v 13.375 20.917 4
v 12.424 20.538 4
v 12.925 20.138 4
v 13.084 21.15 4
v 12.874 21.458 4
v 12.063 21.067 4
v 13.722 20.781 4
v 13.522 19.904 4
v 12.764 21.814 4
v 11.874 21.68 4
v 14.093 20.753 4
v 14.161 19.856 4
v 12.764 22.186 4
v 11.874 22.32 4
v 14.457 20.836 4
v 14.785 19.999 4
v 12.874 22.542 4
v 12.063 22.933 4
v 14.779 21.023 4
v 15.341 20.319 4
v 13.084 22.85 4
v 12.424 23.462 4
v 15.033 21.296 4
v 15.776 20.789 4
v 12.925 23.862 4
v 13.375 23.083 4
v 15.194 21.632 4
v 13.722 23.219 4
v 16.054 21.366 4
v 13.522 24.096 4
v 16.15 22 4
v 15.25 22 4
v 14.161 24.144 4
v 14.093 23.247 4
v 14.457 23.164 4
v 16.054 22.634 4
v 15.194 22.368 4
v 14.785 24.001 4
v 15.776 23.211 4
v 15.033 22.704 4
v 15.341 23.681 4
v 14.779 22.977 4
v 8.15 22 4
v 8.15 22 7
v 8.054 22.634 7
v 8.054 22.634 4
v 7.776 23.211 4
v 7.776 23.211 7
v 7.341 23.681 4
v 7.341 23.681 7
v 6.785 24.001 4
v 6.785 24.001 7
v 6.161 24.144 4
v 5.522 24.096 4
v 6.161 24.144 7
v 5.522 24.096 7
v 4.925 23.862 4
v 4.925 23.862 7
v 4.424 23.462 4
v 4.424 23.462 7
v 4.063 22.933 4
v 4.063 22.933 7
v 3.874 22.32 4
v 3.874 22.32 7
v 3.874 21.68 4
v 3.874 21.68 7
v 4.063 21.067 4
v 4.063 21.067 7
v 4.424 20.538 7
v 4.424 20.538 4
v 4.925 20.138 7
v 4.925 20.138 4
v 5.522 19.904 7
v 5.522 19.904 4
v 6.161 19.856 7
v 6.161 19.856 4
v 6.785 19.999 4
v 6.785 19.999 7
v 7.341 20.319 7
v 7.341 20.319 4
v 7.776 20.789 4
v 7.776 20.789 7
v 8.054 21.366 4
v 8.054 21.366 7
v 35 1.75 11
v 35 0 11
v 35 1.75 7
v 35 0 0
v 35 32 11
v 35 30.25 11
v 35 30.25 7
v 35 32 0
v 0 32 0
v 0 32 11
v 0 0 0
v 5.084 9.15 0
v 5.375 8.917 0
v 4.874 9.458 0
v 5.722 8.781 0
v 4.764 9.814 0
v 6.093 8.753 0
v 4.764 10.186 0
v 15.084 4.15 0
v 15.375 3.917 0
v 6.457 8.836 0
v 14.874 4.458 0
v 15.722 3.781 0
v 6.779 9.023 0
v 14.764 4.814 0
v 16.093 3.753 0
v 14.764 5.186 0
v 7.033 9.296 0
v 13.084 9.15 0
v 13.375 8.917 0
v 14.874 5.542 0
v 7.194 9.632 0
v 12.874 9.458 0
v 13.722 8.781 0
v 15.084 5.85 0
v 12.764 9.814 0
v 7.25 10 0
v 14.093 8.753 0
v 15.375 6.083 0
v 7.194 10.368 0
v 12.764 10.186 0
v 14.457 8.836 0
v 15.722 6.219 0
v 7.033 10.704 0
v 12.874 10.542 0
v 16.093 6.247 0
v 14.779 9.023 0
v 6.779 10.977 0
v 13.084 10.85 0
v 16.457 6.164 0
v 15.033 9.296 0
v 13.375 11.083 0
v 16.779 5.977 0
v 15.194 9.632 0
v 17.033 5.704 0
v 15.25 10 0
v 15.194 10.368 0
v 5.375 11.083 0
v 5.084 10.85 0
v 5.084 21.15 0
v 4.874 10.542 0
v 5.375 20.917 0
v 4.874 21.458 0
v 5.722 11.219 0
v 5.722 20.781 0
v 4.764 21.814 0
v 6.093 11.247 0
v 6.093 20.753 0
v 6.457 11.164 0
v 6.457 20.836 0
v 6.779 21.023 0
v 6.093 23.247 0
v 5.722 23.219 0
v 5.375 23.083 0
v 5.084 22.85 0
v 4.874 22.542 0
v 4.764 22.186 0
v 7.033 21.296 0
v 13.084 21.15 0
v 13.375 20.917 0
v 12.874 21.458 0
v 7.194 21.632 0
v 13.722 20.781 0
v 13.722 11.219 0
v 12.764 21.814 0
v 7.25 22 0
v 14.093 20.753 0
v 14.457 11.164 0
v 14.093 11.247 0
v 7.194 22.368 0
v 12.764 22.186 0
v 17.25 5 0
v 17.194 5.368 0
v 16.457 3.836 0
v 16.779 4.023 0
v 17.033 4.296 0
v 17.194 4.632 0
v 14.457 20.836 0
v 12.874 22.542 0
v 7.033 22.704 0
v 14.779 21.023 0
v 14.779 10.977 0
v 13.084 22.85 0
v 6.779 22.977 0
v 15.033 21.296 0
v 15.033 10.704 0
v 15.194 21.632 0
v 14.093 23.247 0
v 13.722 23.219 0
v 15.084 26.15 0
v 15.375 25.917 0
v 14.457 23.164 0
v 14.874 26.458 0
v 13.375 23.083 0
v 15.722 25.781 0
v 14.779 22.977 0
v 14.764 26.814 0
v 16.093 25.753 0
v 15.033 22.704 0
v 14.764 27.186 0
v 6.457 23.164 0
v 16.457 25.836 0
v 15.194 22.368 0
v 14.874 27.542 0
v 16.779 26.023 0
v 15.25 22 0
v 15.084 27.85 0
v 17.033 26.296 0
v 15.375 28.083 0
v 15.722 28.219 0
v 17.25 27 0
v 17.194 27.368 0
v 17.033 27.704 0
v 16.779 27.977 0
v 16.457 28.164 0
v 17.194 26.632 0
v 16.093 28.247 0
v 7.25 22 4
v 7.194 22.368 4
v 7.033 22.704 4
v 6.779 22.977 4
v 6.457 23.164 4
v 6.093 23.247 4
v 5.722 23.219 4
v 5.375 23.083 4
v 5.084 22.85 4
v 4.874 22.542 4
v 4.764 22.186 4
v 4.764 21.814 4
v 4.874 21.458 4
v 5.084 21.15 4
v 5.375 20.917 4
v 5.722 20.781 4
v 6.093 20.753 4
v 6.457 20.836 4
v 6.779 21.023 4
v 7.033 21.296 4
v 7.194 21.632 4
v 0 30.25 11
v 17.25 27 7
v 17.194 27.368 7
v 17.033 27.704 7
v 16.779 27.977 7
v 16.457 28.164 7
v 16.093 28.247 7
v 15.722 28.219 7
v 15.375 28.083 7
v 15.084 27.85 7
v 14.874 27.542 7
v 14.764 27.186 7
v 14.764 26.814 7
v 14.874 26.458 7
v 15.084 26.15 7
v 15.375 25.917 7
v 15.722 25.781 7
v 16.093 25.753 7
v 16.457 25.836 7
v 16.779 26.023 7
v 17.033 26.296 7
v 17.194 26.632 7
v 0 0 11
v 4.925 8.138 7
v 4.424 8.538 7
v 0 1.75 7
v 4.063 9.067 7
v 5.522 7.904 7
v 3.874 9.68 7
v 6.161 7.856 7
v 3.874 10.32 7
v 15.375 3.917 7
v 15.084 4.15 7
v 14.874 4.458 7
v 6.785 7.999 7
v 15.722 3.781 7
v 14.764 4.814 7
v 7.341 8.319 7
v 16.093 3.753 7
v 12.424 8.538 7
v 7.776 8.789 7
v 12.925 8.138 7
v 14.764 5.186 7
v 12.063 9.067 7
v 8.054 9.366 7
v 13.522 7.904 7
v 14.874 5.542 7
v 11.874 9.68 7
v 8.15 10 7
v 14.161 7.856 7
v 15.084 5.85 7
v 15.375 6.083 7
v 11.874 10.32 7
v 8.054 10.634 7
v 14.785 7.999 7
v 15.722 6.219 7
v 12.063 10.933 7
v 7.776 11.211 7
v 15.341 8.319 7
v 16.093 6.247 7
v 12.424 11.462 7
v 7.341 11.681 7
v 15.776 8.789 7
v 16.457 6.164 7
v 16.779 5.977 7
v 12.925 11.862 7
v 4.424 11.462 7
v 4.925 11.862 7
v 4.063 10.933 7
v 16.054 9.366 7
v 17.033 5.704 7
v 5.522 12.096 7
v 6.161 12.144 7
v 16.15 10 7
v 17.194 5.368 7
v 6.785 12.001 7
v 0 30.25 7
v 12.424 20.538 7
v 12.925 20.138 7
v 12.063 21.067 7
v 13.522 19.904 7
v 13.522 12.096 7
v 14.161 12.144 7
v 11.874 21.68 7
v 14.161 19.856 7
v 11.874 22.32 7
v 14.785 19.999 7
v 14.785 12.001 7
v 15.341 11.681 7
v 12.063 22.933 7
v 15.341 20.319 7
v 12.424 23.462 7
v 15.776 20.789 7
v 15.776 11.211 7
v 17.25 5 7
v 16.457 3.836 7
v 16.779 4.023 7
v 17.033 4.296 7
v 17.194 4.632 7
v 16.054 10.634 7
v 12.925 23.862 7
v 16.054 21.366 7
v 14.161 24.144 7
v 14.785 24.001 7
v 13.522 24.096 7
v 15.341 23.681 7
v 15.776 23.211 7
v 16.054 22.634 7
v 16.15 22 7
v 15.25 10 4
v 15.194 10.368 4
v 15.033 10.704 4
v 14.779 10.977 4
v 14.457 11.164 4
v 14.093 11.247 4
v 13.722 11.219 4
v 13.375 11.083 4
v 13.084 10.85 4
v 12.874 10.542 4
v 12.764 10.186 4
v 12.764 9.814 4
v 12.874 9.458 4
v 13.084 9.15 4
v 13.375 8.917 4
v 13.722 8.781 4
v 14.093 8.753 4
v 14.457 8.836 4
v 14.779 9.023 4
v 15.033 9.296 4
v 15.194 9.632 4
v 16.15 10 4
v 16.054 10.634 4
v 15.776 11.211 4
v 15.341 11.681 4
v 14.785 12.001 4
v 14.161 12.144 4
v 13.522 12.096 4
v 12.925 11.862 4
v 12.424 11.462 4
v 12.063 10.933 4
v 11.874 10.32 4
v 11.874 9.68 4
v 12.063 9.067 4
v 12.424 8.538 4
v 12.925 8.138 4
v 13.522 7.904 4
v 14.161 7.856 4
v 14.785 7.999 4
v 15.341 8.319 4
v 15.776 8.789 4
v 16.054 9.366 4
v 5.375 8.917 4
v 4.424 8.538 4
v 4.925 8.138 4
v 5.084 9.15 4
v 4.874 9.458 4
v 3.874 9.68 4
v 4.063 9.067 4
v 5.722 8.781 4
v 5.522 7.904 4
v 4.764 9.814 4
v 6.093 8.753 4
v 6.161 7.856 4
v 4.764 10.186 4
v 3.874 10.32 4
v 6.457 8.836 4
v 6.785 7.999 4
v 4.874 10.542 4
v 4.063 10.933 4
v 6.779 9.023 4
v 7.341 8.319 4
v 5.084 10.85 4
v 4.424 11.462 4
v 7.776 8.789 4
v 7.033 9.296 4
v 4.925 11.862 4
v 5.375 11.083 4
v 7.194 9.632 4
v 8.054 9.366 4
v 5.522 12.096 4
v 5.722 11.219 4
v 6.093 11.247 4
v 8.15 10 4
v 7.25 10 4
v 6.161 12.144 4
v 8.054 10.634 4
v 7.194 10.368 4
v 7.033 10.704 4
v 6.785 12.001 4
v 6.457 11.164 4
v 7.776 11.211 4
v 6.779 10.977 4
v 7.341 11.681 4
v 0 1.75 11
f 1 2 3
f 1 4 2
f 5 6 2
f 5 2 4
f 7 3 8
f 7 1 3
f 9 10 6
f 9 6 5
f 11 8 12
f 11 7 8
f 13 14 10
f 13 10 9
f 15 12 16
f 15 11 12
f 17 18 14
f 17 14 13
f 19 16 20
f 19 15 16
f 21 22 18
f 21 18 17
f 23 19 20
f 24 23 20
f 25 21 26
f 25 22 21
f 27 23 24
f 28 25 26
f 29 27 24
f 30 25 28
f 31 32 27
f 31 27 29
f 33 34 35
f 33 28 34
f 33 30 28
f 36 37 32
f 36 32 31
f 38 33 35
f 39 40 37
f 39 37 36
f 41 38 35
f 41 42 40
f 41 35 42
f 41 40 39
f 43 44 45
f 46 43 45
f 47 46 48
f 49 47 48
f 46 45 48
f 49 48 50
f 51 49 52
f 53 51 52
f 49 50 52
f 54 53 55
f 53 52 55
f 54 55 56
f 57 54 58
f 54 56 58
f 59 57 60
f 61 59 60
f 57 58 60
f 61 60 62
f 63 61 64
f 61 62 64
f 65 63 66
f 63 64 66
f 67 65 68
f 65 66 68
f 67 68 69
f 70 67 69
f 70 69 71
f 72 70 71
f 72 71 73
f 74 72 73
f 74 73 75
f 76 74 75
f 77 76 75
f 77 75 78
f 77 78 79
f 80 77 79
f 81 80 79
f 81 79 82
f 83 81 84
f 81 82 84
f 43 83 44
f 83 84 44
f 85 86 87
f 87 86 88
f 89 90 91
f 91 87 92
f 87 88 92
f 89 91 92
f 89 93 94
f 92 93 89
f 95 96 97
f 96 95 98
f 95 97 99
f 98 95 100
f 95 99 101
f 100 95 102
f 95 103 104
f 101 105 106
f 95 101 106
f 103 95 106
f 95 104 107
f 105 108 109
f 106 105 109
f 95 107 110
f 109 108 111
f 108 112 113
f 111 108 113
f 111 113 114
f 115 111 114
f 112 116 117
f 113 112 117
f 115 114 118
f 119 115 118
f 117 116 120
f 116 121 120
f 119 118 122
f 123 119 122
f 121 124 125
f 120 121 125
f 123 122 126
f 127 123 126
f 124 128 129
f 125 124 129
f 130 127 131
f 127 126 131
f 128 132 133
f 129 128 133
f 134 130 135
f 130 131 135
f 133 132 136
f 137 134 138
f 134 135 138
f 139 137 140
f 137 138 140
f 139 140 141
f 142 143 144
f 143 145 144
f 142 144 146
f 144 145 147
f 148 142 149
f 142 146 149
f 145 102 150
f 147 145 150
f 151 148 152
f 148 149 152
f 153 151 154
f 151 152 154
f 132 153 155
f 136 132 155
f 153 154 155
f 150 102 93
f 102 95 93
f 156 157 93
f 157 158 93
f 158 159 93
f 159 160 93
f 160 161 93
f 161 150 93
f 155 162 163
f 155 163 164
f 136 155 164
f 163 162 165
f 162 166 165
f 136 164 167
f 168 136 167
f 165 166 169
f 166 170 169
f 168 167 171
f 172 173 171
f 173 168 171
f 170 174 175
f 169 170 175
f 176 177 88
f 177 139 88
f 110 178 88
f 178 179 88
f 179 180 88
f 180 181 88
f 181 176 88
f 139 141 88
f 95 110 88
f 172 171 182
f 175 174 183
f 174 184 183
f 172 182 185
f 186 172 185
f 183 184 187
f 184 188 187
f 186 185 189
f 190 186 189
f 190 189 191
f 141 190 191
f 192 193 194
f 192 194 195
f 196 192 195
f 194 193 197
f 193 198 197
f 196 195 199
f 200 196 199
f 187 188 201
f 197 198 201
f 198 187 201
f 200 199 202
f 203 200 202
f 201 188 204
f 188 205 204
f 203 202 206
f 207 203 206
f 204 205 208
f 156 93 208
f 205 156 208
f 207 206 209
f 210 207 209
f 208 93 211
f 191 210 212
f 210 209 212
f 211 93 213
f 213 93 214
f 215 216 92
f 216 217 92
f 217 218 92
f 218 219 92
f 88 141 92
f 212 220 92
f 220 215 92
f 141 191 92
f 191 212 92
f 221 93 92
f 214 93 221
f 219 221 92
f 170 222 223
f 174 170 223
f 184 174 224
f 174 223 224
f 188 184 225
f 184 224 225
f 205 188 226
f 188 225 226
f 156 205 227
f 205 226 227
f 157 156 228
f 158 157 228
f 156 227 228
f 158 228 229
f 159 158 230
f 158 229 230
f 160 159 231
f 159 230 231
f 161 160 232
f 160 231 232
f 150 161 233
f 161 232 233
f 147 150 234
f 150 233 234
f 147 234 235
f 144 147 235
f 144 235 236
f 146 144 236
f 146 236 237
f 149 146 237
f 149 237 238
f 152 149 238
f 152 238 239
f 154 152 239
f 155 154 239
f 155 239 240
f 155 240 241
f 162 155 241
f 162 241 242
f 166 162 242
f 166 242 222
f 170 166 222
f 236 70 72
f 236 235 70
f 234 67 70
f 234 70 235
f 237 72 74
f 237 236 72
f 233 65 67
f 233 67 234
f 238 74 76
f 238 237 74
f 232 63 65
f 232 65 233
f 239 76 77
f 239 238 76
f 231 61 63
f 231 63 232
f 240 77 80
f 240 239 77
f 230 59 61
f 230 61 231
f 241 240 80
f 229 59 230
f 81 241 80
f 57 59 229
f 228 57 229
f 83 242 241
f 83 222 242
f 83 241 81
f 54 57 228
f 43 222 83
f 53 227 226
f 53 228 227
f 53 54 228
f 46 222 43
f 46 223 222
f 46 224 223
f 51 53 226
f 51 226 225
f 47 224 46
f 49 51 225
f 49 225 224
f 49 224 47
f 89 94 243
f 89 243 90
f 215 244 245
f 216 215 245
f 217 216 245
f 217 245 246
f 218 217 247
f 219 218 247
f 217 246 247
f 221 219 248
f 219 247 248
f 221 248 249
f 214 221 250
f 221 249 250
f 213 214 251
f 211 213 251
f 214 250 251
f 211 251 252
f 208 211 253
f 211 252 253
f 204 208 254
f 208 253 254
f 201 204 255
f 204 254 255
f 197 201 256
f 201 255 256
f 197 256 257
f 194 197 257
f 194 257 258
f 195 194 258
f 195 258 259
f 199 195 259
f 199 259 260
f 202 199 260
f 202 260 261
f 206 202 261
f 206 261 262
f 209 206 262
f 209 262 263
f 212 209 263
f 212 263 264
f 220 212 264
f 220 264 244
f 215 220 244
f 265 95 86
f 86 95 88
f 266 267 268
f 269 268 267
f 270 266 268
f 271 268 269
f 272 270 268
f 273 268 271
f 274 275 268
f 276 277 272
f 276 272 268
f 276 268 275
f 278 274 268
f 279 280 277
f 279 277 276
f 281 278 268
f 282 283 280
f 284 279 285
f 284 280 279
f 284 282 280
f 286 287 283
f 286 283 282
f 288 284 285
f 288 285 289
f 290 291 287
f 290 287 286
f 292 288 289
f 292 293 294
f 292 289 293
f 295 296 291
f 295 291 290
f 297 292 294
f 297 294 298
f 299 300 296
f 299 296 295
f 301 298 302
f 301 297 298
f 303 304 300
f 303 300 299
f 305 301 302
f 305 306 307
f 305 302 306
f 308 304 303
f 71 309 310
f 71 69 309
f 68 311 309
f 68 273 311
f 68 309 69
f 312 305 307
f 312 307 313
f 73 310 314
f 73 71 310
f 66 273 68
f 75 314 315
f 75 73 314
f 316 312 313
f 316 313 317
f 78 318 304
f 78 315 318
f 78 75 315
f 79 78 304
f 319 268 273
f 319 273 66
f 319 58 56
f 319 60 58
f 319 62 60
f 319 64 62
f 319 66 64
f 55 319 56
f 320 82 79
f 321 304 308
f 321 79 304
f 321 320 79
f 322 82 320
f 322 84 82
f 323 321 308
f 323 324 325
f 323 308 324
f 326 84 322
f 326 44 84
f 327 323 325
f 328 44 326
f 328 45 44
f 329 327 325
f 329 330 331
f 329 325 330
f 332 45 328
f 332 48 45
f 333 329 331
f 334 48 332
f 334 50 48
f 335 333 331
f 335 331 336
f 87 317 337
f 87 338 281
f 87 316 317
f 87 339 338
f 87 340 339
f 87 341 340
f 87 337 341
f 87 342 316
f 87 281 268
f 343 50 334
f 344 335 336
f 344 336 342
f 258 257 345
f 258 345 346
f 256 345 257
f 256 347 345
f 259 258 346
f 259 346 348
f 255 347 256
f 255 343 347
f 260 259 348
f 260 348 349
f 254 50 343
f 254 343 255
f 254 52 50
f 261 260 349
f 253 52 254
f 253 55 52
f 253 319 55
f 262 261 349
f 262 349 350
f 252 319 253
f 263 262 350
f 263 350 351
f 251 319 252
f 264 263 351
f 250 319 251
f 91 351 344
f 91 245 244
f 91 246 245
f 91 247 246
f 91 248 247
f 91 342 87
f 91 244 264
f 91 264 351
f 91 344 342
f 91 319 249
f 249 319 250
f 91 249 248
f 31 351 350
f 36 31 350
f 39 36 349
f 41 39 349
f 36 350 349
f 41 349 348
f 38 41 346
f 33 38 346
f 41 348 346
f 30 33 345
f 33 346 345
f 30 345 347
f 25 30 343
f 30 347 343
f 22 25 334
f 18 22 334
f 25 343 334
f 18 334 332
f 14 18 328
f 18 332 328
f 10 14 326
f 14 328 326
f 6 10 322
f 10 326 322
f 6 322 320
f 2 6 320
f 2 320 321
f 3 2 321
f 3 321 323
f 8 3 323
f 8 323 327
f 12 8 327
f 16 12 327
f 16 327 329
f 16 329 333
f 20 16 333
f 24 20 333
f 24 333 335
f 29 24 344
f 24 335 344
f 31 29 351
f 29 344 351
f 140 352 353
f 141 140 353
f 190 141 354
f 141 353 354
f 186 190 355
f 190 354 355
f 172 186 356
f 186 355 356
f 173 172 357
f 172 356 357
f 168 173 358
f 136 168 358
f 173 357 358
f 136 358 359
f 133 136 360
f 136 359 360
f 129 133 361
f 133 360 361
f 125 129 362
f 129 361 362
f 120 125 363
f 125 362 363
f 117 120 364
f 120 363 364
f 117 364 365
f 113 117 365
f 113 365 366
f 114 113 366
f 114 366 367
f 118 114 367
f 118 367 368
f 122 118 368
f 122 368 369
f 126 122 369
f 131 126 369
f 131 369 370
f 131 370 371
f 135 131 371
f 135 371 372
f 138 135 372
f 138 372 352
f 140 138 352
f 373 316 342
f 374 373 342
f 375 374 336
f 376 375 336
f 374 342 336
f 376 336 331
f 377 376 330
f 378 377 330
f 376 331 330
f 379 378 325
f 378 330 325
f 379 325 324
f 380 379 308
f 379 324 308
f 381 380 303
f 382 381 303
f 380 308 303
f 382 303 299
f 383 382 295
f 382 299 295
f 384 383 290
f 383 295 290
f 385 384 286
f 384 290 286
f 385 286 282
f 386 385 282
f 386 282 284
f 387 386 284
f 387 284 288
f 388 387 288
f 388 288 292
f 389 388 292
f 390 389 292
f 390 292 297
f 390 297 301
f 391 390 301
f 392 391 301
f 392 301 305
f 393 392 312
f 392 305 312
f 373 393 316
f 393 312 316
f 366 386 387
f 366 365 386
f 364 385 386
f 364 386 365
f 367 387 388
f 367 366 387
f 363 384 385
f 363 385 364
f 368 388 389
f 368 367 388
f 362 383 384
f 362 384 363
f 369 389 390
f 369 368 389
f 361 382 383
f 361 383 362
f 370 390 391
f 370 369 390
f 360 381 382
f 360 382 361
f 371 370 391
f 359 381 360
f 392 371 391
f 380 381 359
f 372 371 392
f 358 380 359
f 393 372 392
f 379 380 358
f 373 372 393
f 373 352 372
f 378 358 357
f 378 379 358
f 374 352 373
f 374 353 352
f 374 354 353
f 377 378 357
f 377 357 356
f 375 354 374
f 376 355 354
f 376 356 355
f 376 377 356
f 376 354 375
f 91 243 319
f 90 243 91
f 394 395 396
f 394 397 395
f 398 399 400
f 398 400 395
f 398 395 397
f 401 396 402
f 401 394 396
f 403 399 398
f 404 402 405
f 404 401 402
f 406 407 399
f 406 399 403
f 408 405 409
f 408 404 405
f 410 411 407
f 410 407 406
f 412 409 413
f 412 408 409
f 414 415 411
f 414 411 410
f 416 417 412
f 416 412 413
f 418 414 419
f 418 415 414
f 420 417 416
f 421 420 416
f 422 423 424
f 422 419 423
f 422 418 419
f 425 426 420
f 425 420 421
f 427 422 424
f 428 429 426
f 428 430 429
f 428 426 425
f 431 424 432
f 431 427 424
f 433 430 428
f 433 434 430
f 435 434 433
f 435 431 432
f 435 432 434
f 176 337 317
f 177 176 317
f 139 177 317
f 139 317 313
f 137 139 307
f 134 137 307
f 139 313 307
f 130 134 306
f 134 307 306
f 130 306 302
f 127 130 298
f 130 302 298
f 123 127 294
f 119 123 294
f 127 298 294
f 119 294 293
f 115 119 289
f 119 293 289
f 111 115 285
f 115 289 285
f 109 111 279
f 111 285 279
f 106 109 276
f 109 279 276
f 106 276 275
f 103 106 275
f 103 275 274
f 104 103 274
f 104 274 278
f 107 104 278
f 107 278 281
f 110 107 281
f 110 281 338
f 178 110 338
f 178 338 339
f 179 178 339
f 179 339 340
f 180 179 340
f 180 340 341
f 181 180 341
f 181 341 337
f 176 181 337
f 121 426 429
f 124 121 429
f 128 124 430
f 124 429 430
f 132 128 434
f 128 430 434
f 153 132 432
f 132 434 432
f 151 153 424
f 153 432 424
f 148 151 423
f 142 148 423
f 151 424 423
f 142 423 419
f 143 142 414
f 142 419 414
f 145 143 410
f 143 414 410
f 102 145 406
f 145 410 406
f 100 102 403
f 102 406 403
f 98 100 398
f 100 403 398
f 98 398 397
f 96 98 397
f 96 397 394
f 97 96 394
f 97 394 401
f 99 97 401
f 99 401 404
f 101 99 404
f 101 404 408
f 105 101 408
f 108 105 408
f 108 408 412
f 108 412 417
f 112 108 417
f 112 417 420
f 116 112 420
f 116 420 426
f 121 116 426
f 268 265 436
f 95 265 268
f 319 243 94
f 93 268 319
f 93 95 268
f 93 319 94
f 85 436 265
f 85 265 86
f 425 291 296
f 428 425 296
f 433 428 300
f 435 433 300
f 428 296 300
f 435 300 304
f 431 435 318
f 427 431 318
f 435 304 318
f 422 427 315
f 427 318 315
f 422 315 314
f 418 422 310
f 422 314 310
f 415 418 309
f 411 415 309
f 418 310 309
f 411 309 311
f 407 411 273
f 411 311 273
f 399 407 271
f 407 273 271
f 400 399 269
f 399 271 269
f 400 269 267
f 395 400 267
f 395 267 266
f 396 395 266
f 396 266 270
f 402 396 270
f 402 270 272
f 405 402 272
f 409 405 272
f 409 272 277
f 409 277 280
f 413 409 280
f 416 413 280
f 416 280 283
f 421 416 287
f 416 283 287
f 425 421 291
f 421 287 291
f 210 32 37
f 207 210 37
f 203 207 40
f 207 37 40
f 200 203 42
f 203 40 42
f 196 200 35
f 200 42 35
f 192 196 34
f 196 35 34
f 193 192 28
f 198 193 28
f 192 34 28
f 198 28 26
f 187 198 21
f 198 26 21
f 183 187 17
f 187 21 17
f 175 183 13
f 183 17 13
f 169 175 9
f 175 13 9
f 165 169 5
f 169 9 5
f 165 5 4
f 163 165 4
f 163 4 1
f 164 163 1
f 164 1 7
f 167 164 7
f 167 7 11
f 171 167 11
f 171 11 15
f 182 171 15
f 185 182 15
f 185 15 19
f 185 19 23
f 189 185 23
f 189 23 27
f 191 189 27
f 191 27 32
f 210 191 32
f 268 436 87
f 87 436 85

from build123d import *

# Parameters (mm, degrees)
F0_W     = 35
F0_H     = 32
F1_DEPTH = 11
F2_W     = 35
F2_H     = 28.5
F3_DEPTH = 4
F4_R     = 1.25
F5_DEPTH = 25
F6_R     = 2.15
F7_DEPTH = 3


with BuildPart() as f1:
    # F0 (on Top) → F1 (new body)
    with BuildSketch(Plane.XY):
        with Locations((17.5, 16)):
            Rectangle(F0_W, F0_H)
    extrude(amount=F1_DEPTH)

    # F2 (on face) → F3 (cut)
    with BuildSketch(Plane.XY.offset(11)):
        with Locations((17.5, 16)):
            Rectangle(F2_W, F2_H)
    extrude(amount=-F3_DEPTH, mode=Mode.SUBTRACT)

    # F4 (on face) → F5 (cut)
    with BuildSketch(Plane.XY.offset(7)):
        with Locations((6, 22)):
            Circle(F4_R)
        with Locations((6, 10)):
            Circle(F4_R)
        with Locations((14, 22)):
            Circle(F4_R)
        with Locations((14, 10)):
            Circle(F4_R)
        with Locations((16, 27)):
            Circle(F4_R)
        with Locations((16, 5)):
            Circle(F4_R)
    extrude(amount=-F5_DEPTH, mode=Mode.SUBTRACT)

    # F6 (on face) → F7 (cut)
    with BuildSketch(Plane.XY.offset(7)):
        with Locations((6, 22)):
            Circle(F6_R)
        with Locations((14, 22)):
            Circle(F6_R)
        with Locations((14, 10)):
            Circle(F6_R)
        with Locations((6, 10)):
            Circle(F6_R)
    extrude(amount=-F7_DEPTH, mode=Mode.SUBTRACT)


solid = f1.part
